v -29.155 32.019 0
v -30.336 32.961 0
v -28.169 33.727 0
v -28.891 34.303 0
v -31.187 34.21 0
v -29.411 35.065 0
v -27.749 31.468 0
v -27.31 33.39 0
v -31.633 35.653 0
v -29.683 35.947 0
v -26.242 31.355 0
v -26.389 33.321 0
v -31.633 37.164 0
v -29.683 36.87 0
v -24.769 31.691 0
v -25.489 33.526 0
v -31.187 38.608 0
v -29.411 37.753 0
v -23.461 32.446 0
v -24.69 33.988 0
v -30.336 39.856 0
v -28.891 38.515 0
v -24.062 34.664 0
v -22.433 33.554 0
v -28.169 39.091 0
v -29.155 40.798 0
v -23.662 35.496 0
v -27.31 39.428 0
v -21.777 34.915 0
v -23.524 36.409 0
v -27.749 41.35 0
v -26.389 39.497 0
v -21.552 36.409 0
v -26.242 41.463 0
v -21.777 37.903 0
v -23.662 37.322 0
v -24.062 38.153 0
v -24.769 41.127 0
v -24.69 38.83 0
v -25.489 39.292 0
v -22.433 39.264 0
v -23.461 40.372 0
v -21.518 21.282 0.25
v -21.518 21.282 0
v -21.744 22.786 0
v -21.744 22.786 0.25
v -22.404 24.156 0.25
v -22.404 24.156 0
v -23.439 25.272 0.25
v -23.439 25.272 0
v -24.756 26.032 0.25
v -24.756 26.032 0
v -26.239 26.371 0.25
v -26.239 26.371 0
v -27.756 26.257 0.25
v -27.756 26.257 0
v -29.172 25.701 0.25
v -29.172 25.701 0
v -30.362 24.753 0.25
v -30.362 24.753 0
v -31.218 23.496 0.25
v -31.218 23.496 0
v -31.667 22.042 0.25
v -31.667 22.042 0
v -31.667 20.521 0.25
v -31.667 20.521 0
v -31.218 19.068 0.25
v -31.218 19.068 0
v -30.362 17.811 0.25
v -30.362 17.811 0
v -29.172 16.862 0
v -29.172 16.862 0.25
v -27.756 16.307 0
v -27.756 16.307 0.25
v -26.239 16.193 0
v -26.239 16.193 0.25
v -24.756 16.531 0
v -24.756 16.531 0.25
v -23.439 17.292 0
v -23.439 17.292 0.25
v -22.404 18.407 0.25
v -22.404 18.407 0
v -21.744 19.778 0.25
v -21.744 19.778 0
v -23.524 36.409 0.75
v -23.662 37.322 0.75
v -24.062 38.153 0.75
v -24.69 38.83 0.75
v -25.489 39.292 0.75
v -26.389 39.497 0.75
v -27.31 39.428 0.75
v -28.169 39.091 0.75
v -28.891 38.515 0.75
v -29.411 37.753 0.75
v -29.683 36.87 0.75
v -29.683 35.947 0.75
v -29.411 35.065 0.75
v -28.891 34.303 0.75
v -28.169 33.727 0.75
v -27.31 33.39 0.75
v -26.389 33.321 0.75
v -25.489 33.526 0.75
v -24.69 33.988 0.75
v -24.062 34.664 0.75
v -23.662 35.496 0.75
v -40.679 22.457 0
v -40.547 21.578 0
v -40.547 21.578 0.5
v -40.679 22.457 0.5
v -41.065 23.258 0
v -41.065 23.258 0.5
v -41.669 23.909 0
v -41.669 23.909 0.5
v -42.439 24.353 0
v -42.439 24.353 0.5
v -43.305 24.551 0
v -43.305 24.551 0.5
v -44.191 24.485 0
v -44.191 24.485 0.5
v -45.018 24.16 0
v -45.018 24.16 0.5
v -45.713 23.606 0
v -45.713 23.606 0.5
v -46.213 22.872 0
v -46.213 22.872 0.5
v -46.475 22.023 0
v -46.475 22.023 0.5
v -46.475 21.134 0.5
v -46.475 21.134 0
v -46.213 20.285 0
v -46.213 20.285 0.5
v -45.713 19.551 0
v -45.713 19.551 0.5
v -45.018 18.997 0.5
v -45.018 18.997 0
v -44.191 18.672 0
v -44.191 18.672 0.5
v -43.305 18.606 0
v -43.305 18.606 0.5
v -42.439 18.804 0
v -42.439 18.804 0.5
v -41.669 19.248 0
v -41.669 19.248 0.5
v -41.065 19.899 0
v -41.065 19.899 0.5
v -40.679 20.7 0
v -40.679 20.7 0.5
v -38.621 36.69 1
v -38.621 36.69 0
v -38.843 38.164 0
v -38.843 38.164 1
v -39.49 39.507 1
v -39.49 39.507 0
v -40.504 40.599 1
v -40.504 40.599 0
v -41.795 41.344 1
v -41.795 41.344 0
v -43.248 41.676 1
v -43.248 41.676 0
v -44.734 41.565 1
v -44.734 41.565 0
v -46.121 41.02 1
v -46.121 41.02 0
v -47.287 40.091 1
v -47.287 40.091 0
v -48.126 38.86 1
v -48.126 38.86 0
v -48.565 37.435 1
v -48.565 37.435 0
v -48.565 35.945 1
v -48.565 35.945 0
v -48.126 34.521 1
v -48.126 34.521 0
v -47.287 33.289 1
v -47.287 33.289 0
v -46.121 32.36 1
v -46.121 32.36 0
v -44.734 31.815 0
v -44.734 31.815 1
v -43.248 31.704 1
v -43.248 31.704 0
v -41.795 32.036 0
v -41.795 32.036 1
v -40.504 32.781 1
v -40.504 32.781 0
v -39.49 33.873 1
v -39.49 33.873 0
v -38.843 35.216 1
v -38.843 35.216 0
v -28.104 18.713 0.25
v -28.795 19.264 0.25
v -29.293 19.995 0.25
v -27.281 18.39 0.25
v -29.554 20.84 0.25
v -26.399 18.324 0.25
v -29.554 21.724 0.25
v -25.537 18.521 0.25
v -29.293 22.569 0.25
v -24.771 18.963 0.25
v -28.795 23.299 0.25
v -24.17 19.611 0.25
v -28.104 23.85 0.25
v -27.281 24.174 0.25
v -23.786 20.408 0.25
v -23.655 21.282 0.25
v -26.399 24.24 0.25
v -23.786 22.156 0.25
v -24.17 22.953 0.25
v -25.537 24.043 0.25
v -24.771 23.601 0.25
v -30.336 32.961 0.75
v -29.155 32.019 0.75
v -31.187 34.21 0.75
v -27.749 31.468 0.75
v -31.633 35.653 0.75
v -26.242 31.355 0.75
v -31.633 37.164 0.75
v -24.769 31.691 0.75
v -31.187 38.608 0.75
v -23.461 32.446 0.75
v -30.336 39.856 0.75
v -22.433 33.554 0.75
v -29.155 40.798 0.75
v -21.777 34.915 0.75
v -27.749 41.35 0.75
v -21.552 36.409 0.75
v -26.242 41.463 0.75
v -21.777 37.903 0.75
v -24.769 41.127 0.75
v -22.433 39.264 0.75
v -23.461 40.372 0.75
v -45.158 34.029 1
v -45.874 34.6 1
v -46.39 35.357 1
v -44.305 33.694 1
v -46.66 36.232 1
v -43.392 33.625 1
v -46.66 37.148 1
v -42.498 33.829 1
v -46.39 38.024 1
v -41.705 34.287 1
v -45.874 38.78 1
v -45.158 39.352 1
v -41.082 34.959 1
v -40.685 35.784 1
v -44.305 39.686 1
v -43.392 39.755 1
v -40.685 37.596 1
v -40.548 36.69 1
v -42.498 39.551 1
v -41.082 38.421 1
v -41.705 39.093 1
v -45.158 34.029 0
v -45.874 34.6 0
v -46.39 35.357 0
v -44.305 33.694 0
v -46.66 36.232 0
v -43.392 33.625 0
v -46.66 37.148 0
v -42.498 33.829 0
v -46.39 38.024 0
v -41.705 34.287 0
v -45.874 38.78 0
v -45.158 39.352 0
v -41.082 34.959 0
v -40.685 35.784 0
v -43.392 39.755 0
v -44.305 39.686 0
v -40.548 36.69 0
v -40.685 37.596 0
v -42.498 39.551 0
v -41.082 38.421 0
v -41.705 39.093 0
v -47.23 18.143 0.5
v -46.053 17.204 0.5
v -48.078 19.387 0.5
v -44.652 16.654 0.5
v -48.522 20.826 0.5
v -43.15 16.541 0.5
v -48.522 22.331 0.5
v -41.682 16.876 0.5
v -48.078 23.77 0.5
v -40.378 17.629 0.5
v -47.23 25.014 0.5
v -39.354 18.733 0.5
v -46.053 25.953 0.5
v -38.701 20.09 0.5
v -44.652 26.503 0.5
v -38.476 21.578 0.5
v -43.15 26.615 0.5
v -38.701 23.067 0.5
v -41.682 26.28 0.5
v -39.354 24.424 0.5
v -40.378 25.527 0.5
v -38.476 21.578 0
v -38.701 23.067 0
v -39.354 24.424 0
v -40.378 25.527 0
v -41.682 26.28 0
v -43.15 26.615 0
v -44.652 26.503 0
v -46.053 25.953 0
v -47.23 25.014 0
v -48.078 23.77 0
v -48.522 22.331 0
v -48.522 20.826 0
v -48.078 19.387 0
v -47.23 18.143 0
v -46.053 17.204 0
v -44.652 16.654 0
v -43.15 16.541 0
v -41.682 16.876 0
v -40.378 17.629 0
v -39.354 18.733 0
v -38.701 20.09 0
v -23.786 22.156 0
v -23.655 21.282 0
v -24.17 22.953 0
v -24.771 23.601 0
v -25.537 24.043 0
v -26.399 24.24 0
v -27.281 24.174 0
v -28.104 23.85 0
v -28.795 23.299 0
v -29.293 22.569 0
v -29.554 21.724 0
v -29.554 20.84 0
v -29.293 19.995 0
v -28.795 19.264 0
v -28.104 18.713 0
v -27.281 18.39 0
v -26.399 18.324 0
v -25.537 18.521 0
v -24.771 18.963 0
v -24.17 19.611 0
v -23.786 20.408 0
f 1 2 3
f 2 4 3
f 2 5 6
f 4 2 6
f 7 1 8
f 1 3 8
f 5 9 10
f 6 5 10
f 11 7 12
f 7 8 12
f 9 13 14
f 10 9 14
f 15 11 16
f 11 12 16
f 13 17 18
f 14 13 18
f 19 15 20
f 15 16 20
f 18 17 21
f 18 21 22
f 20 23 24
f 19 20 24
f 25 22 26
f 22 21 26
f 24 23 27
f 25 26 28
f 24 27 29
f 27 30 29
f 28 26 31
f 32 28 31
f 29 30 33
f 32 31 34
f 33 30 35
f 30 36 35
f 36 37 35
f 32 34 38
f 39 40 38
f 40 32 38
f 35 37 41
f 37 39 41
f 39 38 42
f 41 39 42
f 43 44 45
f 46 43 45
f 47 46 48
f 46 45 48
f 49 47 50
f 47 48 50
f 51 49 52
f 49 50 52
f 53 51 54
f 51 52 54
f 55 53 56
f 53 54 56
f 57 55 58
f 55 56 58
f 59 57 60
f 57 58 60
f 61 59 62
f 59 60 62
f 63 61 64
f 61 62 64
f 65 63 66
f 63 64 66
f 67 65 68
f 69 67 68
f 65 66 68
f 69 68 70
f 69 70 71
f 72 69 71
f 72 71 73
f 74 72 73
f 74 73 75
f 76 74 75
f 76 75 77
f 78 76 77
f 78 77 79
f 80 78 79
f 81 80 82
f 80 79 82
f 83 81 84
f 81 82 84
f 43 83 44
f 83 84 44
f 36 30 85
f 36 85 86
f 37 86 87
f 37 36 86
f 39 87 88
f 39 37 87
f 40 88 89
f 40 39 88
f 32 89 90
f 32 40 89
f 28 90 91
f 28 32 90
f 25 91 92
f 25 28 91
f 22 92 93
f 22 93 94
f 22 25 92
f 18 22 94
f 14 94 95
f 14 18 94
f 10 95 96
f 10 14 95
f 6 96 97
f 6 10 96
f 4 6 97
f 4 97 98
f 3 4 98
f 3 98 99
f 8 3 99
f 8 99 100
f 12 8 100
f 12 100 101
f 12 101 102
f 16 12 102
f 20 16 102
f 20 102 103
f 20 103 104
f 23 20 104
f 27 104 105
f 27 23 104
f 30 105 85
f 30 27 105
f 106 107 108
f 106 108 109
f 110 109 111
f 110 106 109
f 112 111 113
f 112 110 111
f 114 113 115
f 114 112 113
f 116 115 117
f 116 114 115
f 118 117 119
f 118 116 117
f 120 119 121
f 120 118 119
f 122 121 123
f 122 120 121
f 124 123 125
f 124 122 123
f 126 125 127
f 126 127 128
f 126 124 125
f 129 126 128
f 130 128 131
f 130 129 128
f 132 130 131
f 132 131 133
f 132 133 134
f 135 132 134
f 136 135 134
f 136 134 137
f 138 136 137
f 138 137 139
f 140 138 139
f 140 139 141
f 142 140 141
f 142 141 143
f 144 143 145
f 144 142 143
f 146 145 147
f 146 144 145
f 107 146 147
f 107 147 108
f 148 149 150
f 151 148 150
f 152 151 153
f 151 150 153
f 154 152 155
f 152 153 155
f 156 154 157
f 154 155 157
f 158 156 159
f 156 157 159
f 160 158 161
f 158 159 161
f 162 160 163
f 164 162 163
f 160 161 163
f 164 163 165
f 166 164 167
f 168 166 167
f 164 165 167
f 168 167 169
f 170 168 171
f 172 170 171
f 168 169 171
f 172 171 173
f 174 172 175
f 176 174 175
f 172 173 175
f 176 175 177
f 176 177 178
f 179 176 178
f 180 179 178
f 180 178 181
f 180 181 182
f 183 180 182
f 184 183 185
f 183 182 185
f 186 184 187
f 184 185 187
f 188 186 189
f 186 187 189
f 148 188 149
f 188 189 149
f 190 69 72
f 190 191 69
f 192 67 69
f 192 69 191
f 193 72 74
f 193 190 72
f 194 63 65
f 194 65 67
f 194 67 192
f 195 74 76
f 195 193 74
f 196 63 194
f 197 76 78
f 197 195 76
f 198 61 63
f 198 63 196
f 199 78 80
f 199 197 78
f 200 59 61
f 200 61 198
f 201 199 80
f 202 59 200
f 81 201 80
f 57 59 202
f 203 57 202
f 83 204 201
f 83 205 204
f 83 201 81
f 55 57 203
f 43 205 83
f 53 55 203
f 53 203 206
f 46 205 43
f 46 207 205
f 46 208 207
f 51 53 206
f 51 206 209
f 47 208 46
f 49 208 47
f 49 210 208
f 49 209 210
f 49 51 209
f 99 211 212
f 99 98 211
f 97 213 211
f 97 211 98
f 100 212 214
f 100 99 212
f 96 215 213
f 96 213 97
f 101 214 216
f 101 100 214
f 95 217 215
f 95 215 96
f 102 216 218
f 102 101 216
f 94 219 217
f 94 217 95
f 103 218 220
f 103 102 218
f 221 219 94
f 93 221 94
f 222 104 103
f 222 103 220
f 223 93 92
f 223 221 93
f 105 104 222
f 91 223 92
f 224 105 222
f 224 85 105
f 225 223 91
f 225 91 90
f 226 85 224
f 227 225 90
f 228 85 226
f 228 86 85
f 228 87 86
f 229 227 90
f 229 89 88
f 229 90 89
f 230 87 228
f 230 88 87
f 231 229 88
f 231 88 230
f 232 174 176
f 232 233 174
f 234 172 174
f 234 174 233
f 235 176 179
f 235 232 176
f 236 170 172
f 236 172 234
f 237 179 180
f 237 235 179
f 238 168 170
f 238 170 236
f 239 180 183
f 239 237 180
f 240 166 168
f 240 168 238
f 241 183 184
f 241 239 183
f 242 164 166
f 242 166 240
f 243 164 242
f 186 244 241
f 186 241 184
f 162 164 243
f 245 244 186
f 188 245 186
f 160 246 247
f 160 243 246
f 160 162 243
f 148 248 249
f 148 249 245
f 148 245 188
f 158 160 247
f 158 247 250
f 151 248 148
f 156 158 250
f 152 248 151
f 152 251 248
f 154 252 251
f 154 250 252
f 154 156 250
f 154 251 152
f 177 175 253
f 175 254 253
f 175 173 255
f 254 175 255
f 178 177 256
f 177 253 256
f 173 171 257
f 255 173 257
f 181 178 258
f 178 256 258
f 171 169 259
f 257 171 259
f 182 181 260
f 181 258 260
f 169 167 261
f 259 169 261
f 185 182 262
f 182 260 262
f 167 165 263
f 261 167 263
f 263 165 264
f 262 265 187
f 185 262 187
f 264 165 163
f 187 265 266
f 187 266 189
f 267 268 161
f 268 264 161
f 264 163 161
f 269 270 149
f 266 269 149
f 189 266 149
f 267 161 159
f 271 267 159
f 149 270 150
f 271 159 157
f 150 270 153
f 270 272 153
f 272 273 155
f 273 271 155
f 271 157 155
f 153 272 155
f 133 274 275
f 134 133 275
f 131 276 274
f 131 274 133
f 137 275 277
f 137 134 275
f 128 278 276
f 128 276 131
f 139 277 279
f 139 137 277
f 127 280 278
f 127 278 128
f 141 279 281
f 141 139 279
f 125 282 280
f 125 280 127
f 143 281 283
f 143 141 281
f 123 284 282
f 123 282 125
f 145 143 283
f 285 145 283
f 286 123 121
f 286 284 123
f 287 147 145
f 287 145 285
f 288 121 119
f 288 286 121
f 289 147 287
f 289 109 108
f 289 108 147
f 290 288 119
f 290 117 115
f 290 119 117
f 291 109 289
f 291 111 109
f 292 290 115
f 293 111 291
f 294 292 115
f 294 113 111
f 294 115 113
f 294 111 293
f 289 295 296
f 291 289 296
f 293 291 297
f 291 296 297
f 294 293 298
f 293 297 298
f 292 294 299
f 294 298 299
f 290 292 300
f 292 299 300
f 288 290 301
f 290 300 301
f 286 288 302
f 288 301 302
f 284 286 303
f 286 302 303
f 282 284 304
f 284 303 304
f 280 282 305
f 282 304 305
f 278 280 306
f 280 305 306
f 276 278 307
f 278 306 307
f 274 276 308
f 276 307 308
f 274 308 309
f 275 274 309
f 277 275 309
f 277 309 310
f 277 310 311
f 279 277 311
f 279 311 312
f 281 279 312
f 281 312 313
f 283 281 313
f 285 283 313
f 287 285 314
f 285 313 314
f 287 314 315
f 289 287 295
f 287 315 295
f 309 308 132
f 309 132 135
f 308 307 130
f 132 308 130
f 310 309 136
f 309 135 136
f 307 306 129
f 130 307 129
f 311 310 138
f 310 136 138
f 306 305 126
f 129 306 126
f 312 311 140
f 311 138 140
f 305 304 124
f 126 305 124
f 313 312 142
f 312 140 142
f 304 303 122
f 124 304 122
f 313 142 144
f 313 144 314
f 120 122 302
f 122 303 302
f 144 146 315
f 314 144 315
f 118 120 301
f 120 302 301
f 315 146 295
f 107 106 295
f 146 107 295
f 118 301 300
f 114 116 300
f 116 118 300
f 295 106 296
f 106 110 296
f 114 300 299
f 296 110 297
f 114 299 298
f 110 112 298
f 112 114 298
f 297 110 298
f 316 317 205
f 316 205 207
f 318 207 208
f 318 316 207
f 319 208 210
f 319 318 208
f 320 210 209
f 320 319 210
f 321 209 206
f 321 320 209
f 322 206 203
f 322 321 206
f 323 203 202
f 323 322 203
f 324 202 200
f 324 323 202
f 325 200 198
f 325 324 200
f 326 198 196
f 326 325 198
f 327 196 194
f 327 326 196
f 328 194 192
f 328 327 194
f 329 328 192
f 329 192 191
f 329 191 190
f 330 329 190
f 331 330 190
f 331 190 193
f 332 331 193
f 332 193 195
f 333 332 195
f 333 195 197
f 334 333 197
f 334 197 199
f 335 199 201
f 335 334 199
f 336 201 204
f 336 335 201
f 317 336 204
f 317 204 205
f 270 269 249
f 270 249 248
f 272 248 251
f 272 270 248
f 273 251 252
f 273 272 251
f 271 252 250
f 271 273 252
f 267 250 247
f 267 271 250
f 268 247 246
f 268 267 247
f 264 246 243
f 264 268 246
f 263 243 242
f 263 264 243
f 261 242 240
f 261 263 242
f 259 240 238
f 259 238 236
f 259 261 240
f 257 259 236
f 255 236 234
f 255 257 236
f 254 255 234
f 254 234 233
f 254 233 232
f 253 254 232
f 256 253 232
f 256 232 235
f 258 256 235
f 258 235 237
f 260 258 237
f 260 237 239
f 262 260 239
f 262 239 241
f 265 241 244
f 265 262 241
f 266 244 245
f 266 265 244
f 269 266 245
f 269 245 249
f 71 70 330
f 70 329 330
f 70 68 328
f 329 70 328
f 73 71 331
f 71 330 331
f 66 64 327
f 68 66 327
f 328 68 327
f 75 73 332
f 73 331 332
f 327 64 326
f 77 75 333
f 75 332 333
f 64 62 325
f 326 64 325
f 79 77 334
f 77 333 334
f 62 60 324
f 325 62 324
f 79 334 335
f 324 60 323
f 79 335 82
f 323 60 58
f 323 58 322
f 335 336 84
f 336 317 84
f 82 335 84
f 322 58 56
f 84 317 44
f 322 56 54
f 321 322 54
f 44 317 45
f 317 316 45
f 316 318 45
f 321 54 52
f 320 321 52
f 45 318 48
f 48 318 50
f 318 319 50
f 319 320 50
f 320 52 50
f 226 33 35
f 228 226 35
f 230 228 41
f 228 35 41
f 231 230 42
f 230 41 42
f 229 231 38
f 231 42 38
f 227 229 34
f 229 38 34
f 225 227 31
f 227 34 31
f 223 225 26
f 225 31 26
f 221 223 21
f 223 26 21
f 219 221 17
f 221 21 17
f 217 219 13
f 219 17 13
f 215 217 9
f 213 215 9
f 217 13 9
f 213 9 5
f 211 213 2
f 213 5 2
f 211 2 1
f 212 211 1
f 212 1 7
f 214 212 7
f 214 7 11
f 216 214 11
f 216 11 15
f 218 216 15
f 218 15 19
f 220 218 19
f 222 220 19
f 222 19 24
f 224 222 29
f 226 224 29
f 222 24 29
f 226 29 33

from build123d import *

# Parameters (mm, degrees)
F0_R     = 5
F0_R_2   = 3.073239
F1_DEPTH = 1
F2_R     = 5.068474
F2_R_2   = 3.096698
F3_DEPTH = 0.75
F4_R     = 5.051087
F4_R_2   = 2.980894
F5_DEPTH = 0.5
F6_R     = 5.103074
F6_R_2   = 2.966101
F7_DEPTH = 0.25


with BuildPart() as f1:
    # F0 (on Top) → F1 (new body)
    with BuildSketch(Plane.XY):
        with Locations((-43.621272, 36.690086)):
            Circle(F0_R)
        with Locations((-43.621272, 36.690086)):
            Circle(F0_R_2, mode=Mode.SUBTRACT)
    extrude(amount=F1_DEPTH)


with BuildPart() as f3:
    # F2 (on Top) → F3 (new body)
    with BuildSketch(Plane.XY):
        with Locations((-26.620764, 36.408901)):
            Circle(F2_R)
        with Locations((-26.620764, 36.408901)):
            Circle(F2_R_2, mode=Mode.SUBTRACT)
    extrude(amount=F3_DEPTH)


with BuildPart() as f5:
    # F4 (on Top) → F5 (new body)
    with BuildSketch(Plane.XY):
        with Locations((-43.527544, 21.578392)):
            Circle(F4_R)
        with Locations((-43.527544, 21.578392)):
            Circle(F4_R_2, mode=Mode.SUBTRACT)
    extrude(amount=F5_DEPTH)


with BuildPart() as f7:
    # F6 (on Top) → F7 (new body)
    with BuildSketch(Plane.XY):
        with Locations((-26.620764, 21.281779)):
            Circle(F6_R)
        with Locations((-26.620764, 21.281779)):
            Circle(F6_R_2, mode=Mode.SUBTRACT)
    extrude(amount=F7_DEPTH)


solid = Compound([f1.part, f3.part, f5.part, f7.part])
